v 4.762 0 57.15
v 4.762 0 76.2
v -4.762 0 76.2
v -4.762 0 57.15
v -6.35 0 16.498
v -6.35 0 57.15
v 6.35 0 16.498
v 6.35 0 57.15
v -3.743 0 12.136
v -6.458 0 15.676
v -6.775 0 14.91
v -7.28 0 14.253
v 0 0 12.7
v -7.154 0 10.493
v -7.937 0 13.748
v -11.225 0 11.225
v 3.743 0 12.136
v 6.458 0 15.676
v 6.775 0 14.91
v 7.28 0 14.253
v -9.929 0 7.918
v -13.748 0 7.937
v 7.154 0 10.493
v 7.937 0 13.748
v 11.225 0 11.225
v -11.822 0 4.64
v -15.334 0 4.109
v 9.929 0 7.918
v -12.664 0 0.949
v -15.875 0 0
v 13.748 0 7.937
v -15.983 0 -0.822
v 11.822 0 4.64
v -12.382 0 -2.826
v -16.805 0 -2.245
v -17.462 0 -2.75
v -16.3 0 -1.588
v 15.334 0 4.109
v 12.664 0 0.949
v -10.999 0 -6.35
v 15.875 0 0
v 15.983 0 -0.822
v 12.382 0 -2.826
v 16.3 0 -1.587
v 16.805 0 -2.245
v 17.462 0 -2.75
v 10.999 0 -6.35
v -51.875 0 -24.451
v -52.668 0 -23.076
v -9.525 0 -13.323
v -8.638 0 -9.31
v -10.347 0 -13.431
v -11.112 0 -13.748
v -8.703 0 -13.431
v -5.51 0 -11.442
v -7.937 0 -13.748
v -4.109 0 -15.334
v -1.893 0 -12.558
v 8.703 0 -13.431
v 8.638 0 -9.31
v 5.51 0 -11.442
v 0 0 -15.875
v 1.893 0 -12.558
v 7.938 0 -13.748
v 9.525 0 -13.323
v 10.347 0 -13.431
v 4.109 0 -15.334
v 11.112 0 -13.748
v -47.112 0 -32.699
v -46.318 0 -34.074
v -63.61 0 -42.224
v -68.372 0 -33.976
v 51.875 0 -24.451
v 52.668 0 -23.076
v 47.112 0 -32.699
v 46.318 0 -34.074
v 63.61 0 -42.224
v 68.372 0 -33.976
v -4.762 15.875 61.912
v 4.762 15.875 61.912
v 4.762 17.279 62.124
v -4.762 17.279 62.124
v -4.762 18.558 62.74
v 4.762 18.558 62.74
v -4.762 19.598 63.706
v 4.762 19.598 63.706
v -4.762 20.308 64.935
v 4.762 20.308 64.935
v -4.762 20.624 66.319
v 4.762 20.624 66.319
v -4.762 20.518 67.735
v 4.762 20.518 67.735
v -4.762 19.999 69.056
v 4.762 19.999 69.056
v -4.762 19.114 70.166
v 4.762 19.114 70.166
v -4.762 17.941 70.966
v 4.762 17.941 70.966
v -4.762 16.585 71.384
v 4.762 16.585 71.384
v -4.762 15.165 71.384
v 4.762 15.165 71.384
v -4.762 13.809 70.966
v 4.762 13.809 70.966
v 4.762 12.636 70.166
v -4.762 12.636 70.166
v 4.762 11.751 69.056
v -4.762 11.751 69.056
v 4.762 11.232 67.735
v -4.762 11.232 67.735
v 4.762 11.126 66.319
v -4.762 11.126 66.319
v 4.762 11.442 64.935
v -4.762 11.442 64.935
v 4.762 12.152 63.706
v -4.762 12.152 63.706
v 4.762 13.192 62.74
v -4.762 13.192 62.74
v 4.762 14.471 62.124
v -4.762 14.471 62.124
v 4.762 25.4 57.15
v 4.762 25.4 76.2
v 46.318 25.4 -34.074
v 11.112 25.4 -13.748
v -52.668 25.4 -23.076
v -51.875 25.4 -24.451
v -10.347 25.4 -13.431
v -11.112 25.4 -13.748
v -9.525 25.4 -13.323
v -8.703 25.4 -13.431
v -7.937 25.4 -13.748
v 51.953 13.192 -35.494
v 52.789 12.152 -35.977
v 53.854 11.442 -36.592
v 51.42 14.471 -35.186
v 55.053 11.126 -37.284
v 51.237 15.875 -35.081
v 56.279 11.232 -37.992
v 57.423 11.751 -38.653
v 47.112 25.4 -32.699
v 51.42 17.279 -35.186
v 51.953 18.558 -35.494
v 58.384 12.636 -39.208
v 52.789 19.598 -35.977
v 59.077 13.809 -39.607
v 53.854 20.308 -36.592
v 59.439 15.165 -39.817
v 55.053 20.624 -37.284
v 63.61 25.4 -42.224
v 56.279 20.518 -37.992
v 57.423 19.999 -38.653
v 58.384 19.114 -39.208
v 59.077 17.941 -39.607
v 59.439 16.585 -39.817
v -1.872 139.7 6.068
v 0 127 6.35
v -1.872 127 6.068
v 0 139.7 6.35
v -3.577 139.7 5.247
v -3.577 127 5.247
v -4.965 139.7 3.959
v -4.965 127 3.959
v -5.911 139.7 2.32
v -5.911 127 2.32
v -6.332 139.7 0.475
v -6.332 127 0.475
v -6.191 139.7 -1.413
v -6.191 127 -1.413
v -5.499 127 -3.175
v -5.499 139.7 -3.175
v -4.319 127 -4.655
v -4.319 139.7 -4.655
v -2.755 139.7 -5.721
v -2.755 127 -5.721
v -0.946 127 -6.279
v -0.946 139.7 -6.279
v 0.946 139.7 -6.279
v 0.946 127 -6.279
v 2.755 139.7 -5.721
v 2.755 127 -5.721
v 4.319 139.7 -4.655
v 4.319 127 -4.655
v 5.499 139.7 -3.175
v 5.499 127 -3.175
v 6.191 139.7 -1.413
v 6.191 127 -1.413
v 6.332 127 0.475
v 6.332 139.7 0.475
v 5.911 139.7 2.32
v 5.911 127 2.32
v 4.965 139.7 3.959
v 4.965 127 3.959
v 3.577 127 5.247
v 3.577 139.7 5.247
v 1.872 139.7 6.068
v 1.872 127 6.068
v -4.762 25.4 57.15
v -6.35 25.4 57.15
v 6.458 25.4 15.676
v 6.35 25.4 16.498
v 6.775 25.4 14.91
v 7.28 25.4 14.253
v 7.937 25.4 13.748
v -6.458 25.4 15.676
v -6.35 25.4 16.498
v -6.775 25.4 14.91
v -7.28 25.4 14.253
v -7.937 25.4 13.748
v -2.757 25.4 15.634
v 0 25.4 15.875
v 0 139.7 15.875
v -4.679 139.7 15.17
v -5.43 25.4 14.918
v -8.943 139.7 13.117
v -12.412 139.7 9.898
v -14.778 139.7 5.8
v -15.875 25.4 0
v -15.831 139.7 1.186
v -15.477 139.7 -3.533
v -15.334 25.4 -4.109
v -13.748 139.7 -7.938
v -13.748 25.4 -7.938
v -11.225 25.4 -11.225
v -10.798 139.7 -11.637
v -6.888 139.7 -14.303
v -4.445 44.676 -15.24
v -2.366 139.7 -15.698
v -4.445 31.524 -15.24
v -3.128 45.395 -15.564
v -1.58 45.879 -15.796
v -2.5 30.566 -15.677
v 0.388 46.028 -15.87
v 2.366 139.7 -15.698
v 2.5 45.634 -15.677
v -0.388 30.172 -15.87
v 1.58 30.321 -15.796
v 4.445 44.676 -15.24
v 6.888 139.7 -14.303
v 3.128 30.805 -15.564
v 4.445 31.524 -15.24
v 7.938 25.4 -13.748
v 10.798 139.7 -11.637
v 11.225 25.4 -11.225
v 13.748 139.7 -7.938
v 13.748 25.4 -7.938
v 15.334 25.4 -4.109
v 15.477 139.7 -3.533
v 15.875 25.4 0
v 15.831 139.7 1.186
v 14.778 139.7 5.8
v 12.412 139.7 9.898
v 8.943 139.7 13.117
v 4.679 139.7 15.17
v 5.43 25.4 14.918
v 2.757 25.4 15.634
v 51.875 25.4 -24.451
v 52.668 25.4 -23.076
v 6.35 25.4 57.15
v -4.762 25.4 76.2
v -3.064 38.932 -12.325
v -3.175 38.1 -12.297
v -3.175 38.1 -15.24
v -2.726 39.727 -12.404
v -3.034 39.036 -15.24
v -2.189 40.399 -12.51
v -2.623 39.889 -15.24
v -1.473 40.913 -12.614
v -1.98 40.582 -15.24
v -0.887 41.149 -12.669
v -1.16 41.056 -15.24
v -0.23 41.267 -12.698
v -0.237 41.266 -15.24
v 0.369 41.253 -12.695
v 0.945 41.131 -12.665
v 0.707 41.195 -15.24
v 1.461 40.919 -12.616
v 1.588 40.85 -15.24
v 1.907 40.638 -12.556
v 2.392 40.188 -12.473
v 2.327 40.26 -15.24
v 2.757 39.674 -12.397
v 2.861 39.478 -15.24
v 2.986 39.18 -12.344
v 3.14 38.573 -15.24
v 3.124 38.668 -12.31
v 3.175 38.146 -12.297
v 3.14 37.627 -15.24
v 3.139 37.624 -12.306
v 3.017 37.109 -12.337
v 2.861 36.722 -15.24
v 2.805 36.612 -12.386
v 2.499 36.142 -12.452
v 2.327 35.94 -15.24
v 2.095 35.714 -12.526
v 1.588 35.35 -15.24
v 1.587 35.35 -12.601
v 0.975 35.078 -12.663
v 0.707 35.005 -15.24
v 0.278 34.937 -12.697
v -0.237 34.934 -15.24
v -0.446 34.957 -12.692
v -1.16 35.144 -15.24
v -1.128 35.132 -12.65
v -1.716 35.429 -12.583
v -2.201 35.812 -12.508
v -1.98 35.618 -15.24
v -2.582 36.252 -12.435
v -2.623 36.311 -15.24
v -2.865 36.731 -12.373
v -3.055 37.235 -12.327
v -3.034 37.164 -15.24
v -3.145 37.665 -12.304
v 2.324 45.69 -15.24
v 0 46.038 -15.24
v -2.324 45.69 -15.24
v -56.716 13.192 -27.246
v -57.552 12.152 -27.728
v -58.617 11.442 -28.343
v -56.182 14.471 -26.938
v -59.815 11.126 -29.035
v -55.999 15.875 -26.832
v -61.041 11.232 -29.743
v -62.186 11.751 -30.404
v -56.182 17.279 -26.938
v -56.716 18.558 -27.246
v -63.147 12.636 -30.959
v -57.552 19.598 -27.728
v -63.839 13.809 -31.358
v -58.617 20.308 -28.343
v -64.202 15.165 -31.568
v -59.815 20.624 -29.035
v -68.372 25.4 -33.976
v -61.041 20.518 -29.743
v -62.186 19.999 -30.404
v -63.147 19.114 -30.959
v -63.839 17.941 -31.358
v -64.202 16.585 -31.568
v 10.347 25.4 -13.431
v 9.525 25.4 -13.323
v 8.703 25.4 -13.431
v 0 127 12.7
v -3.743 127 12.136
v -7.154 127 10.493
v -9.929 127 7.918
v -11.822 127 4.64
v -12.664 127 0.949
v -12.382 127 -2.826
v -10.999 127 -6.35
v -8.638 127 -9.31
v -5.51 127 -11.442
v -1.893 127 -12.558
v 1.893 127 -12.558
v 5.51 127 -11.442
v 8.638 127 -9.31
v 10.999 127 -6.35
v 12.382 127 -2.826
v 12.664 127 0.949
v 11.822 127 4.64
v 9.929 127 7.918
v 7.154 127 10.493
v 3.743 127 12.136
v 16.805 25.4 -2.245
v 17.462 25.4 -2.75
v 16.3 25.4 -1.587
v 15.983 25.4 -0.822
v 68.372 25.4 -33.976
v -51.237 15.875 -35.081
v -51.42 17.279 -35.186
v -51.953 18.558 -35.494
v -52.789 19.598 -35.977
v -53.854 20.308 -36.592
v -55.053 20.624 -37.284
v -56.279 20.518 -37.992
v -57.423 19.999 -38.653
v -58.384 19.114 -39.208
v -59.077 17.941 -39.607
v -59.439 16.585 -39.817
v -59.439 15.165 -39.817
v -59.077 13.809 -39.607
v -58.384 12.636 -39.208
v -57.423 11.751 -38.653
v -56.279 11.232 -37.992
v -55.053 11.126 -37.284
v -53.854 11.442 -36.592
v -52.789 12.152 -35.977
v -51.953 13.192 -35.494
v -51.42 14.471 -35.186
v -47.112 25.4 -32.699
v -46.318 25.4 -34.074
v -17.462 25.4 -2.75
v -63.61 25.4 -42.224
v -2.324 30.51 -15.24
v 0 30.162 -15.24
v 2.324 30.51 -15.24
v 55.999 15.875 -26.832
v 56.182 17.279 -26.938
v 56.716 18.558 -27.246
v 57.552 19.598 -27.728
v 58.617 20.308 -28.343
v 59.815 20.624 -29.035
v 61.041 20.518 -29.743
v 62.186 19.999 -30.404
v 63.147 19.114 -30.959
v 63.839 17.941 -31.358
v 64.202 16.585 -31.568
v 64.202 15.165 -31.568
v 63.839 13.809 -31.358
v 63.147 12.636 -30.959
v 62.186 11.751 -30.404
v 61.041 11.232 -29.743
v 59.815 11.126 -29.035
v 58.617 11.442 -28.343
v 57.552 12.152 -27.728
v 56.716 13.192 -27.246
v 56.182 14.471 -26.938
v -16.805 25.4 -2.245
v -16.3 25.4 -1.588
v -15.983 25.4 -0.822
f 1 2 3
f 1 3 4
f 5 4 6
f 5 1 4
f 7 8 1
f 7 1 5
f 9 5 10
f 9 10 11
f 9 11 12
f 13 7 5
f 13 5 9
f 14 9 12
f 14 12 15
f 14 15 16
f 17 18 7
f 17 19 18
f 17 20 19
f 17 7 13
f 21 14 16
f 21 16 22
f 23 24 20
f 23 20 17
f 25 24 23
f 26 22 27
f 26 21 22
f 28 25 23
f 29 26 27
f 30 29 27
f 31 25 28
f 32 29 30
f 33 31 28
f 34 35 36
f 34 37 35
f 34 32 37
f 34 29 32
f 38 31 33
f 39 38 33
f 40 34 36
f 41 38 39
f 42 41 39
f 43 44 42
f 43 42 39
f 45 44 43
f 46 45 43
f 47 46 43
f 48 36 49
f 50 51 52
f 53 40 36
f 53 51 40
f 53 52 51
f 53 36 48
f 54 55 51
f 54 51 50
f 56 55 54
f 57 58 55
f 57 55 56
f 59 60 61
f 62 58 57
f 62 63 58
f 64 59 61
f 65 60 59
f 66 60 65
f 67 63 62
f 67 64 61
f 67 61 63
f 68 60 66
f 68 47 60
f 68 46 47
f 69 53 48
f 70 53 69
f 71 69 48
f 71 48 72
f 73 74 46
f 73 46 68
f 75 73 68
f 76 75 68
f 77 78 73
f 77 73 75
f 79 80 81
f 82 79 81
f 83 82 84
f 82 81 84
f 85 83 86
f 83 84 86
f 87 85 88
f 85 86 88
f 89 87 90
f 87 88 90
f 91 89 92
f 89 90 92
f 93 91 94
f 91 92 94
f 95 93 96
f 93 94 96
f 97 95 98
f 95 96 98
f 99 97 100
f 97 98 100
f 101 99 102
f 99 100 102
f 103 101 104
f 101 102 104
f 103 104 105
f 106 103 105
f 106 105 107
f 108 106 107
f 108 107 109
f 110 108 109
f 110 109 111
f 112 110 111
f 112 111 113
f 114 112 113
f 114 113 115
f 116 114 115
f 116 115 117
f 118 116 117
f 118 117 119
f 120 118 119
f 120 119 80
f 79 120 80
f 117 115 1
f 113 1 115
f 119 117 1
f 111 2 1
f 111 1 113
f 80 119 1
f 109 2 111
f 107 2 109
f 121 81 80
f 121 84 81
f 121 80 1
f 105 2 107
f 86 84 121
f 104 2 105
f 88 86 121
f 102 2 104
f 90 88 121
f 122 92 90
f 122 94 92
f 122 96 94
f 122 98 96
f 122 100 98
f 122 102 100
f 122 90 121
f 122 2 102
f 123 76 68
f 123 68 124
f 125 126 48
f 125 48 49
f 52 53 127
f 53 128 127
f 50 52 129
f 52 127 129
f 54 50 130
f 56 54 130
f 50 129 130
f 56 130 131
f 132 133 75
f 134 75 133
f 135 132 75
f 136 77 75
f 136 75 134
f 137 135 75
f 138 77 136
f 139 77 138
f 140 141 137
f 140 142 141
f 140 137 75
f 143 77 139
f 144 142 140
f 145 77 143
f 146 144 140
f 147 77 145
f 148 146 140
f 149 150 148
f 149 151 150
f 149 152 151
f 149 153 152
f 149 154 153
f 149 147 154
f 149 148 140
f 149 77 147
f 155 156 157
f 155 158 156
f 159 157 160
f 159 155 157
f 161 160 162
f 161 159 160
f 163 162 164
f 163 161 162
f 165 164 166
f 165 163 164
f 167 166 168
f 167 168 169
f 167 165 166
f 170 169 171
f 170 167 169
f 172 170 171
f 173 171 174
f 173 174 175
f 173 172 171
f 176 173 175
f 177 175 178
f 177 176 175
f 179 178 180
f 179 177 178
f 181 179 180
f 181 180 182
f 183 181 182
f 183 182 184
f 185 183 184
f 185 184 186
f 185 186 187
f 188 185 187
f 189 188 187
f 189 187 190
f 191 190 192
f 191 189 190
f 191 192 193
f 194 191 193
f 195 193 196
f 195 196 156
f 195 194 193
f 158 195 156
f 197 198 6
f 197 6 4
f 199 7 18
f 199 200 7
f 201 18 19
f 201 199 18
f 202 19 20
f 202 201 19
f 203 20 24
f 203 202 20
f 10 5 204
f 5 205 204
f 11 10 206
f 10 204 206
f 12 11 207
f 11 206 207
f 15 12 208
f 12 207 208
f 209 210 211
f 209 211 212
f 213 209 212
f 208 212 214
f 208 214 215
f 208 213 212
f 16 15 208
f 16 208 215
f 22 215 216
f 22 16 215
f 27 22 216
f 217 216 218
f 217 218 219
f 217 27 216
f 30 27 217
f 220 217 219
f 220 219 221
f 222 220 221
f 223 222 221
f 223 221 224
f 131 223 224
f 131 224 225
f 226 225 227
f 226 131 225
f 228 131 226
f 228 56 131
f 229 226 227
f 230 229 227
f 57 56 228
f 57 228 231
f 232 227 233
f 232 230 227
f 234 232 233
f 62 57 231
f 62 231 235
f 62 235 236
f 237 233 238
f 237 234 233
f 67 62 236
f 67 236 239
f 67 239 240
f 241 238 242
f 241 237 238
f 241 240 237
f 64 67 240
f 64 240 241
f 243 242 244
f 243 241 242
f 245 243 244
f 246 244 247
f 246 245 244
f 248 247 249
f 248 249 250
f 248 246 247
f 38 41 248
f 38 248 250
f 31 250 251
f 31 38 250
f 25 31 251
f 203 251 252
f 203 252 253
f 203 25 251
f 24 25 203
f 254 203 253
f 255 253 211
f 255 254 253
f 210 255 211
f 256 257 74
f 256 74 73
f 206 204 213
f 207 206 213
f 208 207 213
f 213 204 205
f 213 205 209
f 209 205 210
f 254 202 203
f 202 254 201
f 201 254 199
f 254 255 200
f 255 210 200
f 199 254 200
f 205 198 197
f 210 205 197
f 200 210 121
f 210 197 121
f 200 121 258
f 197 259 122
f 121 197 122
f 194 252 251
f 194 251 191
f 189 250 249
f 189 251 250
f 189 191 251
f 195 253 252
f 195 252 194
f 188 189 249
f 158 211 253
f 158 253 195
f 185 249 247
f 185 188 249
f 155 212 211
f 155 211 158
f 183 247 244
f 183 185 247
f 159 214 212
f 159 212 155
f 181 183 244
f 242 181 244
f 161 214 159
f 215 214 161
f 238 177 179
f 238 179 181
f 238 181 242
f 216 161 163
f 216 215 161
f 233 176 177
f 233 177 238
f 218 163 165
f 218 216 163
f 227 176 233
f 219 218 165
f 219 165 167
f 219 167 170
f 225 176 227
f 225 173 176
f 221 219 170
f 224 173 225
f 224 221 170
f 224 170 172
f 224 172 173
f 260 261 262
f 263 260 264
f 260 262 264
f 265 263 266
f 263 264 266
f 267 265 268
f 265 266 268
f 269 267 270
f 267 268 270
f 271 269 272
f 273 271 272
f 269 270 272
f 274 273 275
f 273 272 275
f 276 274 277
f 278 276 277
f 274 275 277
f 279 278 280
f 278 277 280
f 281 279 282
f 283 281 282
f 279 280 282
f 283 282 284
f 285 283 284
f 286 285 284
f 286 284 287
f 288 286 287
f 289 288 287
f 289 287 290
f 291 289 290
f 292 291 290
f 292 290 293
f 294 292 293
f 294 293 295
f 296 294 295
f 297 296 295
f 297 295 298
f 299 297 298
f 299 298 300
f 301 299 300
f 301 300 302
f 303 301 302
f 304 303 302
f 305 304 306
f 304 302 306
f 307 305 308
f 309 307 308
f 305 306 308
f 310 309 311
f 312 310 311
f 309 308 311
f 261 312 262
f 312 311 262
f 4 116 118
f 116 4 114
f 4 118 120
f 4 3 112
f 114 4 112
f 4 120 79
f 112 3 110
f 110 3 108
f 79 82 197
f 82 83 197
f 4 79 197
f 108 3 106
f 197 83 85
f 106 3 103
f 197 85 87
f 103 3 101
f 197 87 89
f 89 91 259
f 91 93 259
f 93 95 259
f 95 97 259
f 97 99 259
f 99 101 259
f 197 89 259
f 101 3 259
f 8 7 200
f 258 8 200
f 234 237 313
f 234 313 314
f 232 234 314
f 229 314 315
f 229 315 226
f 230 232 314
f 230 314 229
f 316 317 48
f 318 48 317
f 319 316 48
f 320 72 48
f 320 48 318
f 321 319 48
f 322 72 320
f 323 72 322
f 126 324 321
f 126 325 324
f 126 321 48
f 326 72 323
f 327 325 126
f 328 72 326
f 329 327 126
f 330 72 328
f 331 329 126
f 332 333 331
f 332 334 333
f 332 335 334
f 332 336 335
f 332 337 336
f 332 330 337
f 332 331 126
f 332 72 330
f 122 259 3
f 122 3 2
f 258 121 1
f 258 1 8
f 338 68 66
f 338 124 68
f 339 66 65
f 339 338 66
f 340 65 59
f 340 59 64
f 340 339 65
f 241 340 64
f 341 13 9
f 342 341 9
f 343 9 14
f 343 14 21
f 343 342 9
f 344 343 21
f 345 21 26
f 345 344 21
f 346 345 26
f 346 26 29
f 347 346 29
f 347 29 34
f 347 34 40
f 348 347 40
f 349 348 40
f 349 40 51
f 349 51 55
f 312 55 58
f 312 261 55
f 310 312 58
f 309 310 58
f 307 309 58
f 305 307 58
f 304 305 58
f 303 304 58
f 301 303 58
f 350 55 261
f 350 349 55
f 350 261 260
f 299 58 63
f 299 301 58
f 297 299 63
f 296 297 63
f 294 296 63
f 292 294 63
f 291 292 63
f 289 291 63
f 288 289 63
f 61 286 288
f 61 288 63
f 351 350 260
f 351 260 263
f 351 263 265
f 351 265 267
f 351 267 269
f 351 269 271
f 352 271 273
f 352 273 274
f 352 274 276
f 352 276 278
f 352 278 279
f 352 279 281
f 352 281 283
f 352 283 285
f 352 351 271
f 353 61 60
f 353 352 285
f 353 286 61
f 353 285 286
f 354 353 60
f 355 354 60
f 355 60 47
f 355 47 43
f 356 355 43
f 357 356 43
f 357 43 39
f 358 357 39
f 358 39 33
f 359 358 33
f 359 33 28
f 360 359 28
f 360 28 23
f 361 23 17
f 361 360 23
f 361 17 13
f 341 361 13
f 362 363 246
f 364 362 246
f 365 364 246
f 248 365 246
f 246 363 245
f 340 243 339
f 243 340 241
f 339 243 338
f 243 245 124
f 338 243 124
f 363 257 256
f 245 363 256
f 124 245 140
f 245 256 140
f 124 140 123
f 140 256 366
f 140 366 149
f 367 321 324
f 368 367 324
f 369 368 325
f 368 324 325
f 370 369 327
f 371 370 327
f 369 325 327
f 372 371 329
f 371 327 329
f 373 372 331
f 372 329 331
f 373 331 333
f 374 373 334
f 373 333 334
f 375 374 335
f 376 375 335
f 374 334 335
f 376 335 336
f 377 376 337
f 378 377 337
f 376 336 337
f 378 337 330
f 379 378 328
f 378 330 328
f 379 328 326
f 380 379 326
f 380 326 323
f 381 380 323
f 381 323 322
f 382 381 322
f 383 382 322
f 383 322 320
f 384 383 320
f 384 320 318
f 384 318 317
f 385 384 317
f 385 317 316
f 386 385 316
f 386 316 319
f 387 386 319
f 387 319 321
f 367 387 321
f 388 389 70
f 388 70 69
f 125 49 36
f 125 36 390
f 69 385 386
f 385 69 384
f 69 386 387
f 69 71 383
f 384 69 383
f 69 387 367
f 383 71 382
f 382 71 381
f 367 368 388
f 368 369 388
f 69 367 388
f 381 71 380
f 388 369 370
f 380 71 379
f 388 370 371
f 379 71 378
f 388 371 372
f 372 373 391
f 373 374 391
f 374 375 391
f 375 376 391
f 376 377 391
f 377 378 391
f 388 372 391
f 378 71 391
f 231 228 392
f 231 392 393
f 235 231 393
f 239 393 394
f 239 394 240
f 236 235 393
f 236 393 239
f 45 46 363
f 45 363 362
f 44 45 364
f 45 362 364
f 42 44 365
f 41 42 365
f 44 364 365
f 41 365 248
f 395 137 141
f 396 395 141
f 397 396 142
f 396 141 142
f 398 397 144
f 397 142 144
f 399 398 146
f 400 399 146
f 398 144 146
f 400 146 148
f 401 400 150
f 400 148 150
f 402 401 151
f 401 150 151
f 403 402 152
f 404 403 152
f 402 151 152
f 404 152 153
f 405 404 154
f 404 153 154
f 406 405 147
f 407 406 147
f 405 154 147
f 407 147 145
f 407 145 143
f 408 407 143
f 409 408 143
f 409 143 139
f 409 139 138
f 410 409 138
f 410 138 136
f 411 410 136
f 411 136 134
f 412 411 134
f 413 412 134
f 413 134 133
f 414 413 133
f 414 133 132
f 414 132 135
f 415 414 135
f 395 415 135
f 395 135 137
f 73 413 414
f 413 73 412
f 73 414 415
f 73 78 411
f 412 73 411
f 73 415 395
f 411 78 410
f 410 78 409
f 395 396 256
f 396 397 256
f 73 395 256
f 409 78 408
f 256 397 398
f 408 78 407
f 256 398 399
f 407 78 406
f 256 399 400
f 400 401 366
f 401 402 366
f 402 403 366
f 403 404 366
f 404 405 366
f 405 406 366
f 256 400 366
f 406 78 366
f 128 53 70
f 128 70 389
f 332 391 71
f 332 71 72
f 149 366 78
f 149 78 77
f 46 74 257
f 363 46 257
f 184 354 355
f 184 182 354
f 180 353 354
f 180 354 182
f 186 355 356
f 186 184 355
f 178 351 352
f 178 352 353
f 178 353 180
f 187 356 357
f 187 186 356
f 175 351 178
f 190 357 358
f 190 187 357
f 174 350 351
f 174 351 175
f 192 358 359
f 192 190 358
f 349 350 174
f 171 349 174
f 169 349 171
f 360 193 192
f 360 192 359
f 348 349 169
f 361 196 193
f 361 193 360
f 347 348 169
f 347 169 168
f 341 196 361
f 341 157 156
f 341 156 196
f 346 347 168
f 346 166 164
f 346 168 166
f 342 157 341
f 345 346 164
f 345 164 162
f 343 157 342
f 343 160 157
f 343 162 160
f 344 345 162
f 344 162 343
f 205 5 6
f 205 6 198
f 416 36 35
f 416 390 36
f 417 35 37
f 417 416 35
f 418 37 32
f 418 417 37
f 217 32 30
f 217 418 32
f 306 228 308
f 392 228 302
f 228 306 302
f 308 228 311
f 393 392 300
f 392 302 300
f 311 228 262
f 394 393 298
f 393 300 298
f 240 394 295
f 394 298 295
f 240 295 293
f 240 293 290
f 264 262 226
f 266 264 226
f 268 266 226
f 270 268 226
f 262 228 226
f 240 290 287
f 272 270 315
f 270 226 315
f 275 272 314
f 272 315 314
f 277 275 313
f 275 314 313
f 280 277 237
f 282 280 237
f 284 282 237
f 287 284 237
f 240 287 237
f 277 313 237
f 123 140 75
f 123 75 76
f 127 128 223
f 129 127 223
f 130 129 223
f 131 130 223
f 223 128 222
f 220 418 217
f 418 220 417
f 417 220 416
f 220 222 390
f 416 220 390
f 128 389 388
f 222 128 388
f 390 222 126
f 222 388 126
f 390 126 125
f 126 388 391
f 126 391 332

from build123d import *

# Parameters (mm, degrees)
BOSS_EXTRUDE1_REACH      = 170.065
BOSS_EXTRUDE1_END_RADIUS = 15.875
SKETCH2_W                = 9.525
SKETCH2_H                = 25.4
SKETCH3_R                = 4.7625
CUT_EXTRUDE1_DEPTH       = 161.463193307
BOSS_EXTRUDE2_REACH      = 160.432
BOSS_EXTRUDE2_END_RADIUS = 15.875
SKETCH4_W                = 12.7
SKETCH4_H                = 25.4
FILLET1_R                = 3.175
CIRPATTERN1_COUNT        = 3
FILLET1_OF_CIRPATTERN1_R = 3.175
SKETCH5_R                = 7.9375
CUT_EXTRUDE3_DEPTH       = 0.635
SKETCH6_R                = 3.175
CUT_EXTRUDE4_DEPTH       = 12.7


with BuildPart() as part:
    # Sketch1 → Base-Revolve (revolve)
    with BuildSketch(Plane.XY, mode=Mode.PRIVATE) as base_revolve_sk:
        Polygon((12.7, 0), (12.7, 127), (6.35, 127), (6.35, 139.7), (15.875, 139.7), (15.875, 0), align=None)
    revolve(base_revolve_sk.sketch.rotate(Axis((0, 118.223731343, 0), (0, -1, 0)), 90), axis=Axis((0, 118.223731343, 0), (0, -1, 0)))

    # Boss-Extrude1: up to this cylinder (the profile starts outside it)
    boss_extrude1_end = Plane(origin=(0, 12.7, 0), z_dir=(0, 1, 0)) * Cylinder(BOSS_EXTRUDE1_END_RADIUS, 372.88, mode=Mode.PRIVATE)
    # Sketch2 → Boss-Extrude1 (add, up to the surface)
    with BuildSketch(Plane.XY.offset(76.2), mode=Mode.PRIVATE) as boss_extrude1_sk1:
        with Locations((0, 12.7)):
            Rectangle(SKETCH2_W, SKETCH2_H)
    boss_extrude1_tool1 = extrude(boss_extrude1_sk1.sketch, amount=-BOSS_EXTRUDE1_REACH, mode=Mode.PRIVATE) - boss_extrude1_end
    boss_extrude1 = boss_extrude1_tool1.solids().sort_by_distance((0, 12.7, 76.2))[0]
    add(boss_extrude1)

    # Sketch3 → Cut-Extrude1 (cut, through all)
    with BuildSketch(Plane(origin=(4.7625, 0, 0), x_dir=(0, 0, -1), z_dir=(1, 0, 0))):
        with Locations((-66.675, 15.875)):
            Circle(SKETCH3_R)
    cut_extrude1 = extrude(amount=-CUT_EXTRUDE1_DEPTH, mode=Mode.SUBTRACT)

    # Boss-Extrude2: up to this cylinder (the profile starts outside it)
    boss_extrude2_end = Plane(origin=(0, 12.7, 0), z_dir=(0, 1, 0)) * Cylinder(BOSS_EXTRUDE2_END_RADIUS, 353.614, mode=Mode.PRIVATE)
    # Sketch4 → Boss-Extrude2 (add, up to the surface)
    with BuildSketch(Plane.XY.offset(57.15), mode=Mode.PRIVATE) as boss_extrude2_sk1:
        with Locations((0, 12.7)):
            Rectangle(SKETCH4_W, SKETCH4_H)
    boss_extrude2_tool1 = extrude(boss_extrude2_sk1.sketch, amount=-BOSS_EXTRUDE2_REACH, mode=Mode.PRIVATE) - boss_extrude2_end
    boss_extrude2 = boss_extrude2_tool1.solids().sort_by_distance((0, 12.7, 57.15))[0]
    add(boss_extrude2)

    # Fillet1
    fillet1_edges = [part.edges().sort_by_distance(p)[0] for p in [
        (-6.35, 12.7, 14.549677831),
        (6.35, 12.7, 14.549677831),
    ]]
    fillet(fillet1_edges, radius=FILLET1_R)

    # CirPattern1: Boss-Extrude1, Cut-Extrude1, Boss-Extrude2 ×3 about axis
    cirpattern1_axis = Axis((0, 0, 0), (0, 1, 0))
    add([boss_extrude1.rotate(cirpattern1_axis, i * 360 / CIRPATTERN1_COUNT) for i in range(1, CIRPATTERN1_COUNT)])
    add([cut_extrude1.rotate(cirpattern1_axis, i * 360 / CIRPATTERN1_COUNT) for i in range(1, CIRPATTERN1_COUNT)], mode=Mode.SUBTRACT)
    add([boss_extrude2.rotate(cirpattern1_axis, i * 360 / CIRPATTERN1_COUNT) for i in range(1, CIRPATTERN1_COUNT)])

    # Fillet1 of CirPattern1
    fillet1_of_cirpattern1_edges = [part.edges().sort_by_distance(p)[0] for p in [
        (15.775390619, 12.7, -1.775577602),
        (9.425390619, 12.7, -12.77410023),
        (-9.425390619, 12.7, -12.77410023),
        (-15.775390619, 12.7, -1.775577602),
    ]]
    fillet(fillet1_of_cirpattern1_edges, radius=FILLET1_OF_CIRPATTERN1_R)

    # Sketch5 → Cut-Extrude3 (cut)
    with BuildSketch(Plane.XY.offset(-15.875)):
        with Locations((0, 38.1)):
            Circle(SKETCH5_R)
    extrude(amount=CUT_EXTRUDE3_DEPTH, mode=Mode.SUBTRACT)

    # Sketch6 → Cut-Extrude4 (cut)
    with BuildSketch(Plane(origin=(0, 0, -15.24), x_dir=(-1, 0, 0), z_dir=(0, 0, -1))):
        with Locations((0, 38.1)):
            Circle(SKETCH6_R)
    extrude(amount=-CUT_EXTRUDE4_DEPTH, mode=Mode.SUBTRACT)


solid = part.part
